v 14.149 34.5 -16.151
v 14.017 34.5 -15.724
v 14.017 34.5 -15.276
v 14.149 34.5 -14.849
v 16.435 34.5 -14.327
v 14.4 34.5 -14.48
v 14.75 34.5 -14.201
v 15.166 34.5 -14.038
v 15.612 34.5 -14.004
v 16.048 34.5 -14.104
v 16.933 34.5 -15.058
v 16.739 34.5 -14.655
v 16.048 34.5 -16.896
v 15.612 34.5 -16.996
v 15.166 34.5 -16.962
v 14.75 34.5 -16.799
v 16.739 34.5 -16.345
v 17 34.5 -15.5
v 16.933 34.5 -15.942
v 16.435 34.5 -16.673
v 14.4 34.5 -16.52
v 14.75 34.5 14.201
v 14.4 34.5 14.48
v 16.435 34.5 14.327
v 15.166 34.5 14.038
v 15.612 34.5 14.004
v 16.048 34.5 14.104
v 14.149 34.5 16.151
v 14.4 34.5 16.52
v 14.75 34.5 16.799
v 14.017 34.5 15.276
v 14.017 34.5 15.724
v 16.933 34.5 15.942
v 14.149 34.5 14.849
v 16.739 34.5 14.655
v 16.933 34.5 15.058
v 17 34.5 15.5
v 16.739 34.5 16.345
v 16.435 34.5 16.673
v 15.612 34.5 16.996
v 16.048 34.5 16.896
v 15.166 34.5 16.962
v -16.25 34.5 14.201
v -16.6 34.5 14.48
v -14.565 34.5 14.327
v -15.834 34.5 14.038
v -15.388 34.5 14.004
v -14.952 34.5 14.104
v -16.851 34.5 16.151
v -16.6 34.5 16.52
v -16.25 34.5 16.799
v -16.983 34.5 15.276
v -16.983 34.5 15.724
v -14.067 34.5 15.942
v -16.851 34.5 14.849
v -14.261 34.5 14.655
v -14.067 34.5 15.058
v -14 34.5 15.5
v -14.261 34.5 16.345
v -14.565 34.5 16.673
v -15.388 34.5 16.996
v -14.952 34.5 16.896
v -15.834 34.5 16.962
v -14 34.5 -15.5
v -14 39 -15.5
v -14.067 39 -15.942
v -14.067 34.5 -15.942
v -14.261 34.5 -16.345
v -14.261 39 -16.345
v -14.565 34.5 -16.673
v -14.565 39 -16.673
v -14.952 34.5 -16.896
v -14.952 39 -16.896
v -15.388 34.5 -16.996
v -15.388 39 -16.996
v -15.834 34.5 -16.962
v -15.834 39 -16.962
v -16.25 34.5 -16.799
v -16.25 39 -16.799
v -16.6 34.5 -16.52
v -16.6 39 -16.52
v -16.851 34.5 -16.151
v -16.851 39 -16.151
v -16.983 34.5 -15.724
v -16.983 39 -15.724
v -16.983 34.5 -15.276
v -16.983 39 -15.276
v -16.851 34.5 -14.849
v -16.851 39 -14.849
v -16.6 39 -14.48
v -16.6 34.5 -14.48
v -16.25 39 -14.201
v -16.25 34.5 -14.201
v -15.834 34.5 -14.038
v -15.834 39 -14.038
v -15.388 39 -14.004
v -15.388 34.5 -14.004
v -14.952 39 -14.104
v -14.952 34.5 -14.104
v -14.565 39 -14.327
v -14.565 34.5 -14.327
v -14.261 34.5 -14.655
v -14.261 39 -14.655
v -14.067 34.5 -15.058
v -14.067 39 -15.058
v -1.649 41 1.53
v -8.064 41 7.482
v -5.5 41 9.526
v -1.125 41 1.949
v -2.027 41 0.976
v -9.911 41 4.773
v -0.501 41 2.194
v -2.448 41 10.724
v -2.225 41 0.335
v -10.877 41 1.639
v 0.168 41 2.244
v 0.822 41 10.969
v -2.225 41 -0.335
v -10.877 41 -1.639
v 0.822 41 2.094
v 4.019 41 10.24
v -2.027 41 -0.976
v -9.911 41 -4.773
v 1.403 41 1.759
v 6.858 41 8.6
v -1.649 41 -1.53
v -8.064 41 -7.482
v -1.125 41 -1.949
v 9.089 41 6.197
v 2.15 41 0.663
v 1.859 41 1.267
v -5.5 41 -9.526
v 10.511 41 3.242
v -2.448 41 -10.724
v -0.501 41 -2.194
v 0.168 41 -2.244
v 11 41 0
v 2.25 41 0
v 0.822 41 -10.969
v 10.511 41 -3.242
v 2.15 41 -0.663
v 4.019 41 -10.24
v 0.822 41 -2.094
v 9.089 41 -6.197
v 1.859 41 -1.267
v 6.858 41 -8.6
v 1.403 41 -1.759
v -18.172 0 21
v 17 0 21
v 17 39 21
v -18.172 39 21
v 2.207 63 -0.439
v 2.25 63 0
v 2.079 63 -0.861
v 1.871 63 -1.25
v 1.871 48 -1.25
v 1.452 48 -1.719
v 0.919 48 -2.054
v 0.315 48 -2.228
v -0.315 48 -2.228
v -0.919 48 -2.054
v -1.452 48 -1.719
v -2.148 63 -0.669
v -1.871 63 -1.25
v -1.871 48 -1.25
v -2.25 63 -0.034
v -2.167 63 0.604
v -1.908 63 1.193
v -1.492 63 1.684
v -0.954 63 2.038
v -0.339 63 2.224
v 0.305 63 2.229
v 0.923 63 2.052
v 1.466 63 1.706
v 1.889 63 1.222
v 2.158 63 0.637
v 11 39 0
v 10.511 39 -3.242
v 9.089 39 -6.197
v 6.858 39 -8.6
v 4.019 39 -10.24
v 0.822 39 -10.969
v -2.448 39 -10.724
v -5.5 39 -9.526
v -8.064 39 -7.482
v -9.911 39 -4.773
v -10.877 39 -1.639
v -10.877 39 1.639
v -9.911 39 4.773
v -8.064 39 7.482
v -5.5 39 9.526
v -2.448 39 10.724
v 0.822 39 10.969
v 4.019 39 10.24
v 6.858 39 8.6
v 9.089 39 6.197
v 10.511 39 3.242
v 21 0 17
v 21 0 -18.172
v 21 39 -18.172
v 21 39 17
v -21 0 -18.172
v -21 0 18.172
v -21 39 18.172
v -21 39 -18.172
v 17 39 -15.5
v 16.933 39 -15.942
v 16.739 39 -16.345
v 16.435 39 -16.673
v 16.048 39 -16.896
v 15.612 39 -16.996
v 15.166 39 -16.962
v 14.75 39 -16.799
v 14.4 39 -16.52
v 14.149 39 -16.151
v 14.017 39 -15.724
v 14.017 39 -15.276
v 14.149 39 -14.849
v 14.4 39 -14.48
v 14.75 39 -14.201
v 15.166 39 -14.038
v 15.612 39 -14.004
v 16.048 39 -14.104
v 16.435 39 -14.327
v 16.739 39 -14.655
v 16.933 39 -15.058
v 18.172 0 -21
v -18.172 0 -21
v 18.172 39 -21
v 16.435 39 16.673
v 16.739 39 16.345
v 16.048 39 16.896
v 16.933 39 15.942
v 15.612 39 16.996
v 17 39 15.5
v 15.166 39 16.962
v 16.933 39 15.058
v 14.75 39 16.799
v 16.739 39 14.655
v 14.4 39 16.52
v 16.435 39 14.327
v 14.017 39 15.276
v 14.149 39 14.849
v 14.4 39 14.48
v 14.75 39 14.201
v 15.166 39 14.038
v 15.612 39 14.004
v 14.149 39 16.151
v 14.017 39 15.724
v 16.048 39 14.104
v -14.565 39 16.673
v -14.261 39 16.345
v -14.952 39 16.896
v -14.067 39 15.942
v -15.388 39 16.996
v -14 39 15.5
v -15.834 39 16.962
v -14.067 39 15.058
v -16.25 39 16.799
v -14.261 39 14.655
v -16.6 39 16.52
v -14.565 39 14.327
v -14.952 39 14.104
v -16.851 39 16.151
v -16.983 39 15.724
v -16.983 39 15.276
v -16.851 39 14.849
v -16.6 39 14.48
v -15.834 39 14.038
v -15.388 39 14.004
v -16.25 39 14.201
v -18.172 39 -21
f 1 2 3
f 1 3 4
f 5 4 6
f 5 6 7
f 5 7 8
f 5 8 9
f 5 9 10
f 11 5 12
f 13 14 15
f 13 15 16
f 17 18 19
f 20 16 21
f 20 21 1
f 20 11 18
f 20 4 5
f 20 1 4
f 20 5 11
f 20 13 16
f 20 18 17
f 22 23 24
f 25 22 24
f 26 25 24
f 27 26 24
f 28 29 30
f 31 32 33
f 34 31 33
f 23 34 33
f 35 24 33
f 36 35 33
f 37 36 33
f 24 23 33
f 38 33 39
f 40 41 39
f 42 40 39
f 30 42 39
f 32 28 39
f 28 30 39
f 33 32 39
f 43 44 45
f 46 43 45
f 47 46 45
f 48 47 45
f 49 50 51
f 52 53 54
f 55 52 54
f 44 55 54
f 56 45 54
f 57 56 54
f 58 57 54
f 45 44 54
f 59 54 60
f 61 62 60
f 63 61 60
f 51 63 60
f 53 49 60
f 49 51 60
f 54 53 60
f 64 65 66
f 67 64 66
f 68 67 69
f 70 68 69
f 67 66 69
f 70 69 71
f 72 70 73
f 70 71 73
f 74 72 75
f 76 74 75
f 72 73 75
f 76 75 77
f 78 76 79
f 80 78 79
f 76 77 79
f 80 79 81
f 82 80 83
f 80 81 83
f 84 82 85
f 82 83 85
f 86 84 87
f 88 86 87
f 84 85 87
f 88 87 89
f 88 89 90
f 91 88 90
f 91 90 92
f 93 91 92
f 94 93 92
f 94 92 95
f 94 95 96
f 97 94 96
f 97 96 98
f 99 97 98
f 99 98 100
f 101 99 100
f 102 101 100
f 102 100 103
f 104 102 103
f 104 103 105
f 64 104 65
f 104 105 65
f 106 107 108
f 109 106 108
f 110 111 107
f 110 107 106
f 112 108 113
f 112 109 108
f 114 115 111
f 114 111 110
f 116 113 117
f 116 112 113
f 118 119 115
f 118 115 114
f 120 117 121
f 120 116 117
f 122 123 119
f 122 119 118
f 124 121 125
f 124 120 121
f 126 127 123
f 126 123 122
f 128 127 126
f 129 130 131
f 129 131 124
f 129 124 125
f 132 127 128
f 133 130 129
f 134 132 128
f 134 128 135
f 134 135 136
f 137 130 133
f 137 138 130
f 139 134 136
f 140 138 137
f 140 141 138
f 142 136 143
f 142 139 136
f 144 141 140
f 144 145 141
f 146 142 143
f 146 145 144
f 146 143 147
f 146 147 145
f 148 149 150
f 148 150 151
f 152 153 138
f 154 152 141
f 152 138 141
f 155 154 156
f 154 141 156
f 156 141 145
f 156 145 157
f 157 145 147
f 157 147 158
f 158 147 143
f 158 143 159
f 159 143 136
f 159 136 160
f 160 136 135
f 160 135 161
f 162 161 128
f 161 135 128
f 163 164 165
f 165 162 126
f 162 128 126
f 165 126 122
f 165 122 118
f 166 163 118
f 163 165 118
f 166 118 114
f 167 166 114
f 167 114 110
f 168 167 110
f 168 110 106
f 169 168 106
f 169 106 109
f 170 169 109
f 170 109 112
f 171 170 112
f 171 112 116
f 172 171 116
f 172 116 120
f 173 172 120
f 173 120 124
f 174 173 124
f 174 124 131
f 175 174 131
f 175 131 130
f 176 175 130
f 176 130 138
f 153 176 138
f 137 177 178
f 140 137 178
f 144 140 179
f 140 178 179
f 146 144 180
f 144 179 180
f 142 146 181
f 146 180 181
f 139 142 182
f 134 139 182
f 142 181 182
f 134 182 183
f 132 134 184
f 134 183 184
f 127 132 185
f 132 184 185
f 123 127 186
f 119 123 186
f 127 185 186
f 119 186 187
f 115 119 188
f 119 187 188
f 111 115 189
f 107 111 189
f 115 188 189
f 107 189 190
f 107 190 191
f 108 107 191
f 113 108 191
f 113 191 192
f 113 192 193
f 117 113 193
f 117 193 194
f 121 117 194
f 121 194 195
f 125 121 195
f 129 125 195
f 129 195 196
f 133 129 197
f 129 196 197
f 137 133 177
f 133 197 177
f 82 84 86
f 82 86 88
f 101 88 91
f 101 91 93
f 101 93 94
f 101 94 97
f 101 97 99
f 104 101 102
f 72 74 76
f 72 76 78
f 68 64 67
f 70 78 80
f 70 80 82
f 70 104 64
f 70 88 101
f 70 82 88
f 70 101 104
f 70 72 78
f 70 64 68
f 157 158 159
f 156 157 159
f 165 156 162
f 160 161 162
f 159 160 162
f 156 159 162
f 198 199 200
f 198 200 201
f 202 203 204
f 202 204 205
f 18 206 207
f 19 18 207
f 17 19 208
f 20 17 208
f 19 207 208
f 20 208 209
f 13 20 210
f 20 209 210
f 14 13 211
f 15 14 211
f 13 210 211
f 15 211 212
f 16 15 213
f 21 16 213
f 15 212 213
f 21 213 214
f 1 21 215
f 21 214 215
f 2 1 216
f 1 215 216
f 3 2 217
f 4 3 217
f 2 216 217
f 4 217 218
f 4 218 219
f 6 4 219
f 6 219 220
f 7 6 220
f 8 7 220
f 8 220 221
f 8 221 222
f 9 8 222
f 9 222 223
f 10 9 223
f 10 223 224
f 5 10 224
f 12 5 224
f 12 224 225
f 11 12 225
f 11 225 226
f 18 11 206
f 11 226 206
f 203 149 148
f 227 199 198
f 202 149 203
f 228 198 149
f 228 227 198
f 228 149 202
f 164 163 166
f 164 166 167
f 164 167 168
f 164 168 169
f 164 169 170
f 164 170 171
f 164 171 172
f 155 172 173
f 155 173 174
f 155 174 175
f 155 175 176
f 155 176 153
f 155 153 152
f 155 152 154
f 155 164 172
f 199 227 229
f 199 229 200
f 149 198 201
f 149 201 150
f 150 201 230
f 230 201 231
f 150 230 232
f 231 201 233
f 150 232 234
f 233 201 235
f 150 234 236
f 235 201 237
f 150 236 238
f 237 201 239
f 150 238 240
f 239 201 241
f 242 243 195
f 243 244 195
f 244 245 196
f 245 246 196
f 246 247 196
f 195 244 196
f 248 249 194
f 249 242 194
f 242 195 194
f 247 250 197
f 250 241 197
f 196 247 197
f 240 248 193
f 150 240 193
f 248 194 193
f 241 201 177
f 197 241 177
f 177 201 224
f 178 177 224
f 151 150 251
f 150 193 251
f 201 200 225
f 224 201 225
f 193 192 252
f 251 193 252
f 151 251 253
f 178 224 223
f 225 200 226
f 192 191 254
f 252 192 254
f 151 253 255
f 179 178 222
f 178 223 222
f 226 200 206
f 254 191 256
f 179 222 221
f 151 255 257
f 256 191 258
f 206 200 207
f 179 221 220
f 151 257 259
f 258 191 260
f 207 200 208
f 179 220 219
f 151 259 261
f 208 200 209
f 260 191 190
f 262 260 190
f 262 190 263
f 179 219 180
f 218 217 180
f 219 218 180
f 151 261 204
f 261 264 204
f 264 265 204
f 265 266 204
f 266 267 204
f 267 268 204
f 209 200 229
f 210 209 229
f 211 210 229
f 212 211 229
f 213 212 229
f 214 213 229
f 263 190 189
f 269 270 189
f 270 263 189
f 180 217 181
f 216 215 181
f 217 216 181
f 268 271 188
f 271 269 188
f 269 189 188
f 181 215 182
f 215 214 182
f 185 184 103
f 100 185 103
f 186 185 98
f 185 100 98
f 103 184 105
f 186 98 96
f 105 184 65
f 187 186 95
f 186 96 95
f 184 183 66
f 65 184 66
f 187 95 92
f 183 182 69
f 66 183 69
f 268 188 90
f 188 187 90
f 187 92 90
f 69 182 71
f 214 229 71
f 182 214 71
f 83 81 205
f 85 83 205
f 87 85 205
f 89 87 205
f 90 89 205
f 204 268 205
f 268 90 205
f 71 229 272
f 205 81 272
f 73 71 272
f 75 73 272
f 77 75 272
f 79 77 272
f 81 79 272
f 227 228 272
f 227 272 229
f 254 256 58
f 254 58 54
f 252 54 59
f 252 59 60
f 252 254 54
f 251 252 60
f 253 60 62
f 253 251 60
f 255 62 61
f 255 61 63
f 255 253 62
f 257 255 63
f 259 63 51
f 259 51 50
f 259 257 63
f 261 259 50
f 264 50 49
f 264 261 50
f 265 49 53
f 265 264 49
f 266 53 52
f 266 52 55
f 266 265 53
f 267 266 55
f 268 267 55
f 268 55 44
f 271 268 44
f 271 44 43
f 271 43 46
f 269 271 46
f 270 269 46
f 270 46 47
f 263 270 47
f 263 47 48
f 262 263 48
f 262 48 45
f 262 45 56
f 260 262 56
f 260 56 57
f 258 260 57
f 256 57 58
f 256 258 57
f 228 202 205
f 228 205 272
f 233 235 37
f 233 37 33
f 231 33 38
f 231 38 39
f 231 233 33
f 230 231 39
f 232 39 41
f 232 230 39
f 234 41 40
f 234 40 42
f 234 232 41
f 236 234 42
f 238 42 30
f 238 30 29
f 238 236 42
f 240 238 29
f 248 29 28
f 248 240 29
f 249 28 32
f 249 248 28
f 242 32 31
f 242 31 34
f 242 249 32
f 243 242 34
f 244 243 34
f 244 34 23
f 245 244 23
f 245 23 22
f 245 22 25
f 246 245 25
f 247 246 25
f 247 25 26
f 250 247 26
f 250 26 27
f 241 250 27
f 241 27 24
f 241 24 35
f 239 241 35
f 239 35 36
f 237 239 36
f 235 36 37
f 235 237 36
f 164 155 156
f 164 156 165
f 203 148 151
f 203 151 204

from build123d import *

# Parameters (mm, degrees)
BOSS_EXTRUDE1_DEPTH = 39
SKETCH2_R           = 2.25
BOSS_EXTRUDE2_DEPTH = 24
SKETCH3_R           = 11
BOSS_EXTRUDE3_DEPTH = 2
SKETCH4_R           = 1.5
CUT_EXTRUDE1_DEPTH  = 4.5
CUT_EXTRUDE2_DEPTH  = 15


with BuildPart() as part:
    # Sketch1 → Boss-Extrude1 (new body)
    with BuildSketch(Plane(origin=(0, 0, 0), x_dir=(1, 0, 0), z_dir=(0, 1, 0))):
        Polygon((-21, 18.171572875), (-18.171572875, 21), (18.171572875, 21), (21, 18.171572875), (21, -17), (17, -21), (-18.171572875, -21), (-21, -18.171572875), align=None)
    extrude(amount=BOSS_EXTRUDE1_DEPTH)

    # Sketch2 → Boss-Extrude2 (add)
    with BuildSketch(Plane(origin=(0, 39, 0), x_dir=(1, 0, 0), z_dir=(0, 1, 0))):
        Circle(SKETCH2_R)
    extrude(amount=BOSS_EXTRUDE2_DEPTH)

    # Sketch3 → Boss-Extrude3 (add)
    with BuildSketch(Plane(origin=(0, 39, 0), x_dir=(1, 0, 0), z_dir=(0, 1, 0))):
        Circle(SKETCH3_R)
    extrude(amount=BOSS_EXTRUDE3_DEPTH)

    # Sketch4 → Cut-Extrude1 (cut)
    with BuildSketch(Plane(origin=(0, 39, 0), x_dir=(1, 0, 0), z_dir=(0, 1, 0))):
        with Locations((-15.5, 15.5)):
            Circle(SKETCH4_R)
        with Locations((15.5, 15.5)):
            Circle(SKETCH4_R)
    cut_extrude1 = extrude(amount=-CUT_EXTRUDE1_DEPTH, mode=Mode.SUBTRACT)

    # Mirror1: Cut-Extrude1 across plane
    add(cut_extrude1.mirror(Plane.XY), mode=Mode.SUBTRACT)

    # Sketch5 → Cut-Extrude2 (cut)
    with BuildSketch(Plane(origin=(0, 63, 0), x_dir=(1, 0, 0), z_dir=(0, 1, 0))):
        with BuildLine():
            Line((1.870828693, 1.25), (-1.870828693, 1.25))
            ThreePointArc((-1.870828693, 1.25), (0, 2.25), (1.870828693, 1.25))
        make_face()
    extrude(amount=-CUT_EXTRUDE2_DEPTH, mode=Mode.SUBTRACT)


solid = part.part
